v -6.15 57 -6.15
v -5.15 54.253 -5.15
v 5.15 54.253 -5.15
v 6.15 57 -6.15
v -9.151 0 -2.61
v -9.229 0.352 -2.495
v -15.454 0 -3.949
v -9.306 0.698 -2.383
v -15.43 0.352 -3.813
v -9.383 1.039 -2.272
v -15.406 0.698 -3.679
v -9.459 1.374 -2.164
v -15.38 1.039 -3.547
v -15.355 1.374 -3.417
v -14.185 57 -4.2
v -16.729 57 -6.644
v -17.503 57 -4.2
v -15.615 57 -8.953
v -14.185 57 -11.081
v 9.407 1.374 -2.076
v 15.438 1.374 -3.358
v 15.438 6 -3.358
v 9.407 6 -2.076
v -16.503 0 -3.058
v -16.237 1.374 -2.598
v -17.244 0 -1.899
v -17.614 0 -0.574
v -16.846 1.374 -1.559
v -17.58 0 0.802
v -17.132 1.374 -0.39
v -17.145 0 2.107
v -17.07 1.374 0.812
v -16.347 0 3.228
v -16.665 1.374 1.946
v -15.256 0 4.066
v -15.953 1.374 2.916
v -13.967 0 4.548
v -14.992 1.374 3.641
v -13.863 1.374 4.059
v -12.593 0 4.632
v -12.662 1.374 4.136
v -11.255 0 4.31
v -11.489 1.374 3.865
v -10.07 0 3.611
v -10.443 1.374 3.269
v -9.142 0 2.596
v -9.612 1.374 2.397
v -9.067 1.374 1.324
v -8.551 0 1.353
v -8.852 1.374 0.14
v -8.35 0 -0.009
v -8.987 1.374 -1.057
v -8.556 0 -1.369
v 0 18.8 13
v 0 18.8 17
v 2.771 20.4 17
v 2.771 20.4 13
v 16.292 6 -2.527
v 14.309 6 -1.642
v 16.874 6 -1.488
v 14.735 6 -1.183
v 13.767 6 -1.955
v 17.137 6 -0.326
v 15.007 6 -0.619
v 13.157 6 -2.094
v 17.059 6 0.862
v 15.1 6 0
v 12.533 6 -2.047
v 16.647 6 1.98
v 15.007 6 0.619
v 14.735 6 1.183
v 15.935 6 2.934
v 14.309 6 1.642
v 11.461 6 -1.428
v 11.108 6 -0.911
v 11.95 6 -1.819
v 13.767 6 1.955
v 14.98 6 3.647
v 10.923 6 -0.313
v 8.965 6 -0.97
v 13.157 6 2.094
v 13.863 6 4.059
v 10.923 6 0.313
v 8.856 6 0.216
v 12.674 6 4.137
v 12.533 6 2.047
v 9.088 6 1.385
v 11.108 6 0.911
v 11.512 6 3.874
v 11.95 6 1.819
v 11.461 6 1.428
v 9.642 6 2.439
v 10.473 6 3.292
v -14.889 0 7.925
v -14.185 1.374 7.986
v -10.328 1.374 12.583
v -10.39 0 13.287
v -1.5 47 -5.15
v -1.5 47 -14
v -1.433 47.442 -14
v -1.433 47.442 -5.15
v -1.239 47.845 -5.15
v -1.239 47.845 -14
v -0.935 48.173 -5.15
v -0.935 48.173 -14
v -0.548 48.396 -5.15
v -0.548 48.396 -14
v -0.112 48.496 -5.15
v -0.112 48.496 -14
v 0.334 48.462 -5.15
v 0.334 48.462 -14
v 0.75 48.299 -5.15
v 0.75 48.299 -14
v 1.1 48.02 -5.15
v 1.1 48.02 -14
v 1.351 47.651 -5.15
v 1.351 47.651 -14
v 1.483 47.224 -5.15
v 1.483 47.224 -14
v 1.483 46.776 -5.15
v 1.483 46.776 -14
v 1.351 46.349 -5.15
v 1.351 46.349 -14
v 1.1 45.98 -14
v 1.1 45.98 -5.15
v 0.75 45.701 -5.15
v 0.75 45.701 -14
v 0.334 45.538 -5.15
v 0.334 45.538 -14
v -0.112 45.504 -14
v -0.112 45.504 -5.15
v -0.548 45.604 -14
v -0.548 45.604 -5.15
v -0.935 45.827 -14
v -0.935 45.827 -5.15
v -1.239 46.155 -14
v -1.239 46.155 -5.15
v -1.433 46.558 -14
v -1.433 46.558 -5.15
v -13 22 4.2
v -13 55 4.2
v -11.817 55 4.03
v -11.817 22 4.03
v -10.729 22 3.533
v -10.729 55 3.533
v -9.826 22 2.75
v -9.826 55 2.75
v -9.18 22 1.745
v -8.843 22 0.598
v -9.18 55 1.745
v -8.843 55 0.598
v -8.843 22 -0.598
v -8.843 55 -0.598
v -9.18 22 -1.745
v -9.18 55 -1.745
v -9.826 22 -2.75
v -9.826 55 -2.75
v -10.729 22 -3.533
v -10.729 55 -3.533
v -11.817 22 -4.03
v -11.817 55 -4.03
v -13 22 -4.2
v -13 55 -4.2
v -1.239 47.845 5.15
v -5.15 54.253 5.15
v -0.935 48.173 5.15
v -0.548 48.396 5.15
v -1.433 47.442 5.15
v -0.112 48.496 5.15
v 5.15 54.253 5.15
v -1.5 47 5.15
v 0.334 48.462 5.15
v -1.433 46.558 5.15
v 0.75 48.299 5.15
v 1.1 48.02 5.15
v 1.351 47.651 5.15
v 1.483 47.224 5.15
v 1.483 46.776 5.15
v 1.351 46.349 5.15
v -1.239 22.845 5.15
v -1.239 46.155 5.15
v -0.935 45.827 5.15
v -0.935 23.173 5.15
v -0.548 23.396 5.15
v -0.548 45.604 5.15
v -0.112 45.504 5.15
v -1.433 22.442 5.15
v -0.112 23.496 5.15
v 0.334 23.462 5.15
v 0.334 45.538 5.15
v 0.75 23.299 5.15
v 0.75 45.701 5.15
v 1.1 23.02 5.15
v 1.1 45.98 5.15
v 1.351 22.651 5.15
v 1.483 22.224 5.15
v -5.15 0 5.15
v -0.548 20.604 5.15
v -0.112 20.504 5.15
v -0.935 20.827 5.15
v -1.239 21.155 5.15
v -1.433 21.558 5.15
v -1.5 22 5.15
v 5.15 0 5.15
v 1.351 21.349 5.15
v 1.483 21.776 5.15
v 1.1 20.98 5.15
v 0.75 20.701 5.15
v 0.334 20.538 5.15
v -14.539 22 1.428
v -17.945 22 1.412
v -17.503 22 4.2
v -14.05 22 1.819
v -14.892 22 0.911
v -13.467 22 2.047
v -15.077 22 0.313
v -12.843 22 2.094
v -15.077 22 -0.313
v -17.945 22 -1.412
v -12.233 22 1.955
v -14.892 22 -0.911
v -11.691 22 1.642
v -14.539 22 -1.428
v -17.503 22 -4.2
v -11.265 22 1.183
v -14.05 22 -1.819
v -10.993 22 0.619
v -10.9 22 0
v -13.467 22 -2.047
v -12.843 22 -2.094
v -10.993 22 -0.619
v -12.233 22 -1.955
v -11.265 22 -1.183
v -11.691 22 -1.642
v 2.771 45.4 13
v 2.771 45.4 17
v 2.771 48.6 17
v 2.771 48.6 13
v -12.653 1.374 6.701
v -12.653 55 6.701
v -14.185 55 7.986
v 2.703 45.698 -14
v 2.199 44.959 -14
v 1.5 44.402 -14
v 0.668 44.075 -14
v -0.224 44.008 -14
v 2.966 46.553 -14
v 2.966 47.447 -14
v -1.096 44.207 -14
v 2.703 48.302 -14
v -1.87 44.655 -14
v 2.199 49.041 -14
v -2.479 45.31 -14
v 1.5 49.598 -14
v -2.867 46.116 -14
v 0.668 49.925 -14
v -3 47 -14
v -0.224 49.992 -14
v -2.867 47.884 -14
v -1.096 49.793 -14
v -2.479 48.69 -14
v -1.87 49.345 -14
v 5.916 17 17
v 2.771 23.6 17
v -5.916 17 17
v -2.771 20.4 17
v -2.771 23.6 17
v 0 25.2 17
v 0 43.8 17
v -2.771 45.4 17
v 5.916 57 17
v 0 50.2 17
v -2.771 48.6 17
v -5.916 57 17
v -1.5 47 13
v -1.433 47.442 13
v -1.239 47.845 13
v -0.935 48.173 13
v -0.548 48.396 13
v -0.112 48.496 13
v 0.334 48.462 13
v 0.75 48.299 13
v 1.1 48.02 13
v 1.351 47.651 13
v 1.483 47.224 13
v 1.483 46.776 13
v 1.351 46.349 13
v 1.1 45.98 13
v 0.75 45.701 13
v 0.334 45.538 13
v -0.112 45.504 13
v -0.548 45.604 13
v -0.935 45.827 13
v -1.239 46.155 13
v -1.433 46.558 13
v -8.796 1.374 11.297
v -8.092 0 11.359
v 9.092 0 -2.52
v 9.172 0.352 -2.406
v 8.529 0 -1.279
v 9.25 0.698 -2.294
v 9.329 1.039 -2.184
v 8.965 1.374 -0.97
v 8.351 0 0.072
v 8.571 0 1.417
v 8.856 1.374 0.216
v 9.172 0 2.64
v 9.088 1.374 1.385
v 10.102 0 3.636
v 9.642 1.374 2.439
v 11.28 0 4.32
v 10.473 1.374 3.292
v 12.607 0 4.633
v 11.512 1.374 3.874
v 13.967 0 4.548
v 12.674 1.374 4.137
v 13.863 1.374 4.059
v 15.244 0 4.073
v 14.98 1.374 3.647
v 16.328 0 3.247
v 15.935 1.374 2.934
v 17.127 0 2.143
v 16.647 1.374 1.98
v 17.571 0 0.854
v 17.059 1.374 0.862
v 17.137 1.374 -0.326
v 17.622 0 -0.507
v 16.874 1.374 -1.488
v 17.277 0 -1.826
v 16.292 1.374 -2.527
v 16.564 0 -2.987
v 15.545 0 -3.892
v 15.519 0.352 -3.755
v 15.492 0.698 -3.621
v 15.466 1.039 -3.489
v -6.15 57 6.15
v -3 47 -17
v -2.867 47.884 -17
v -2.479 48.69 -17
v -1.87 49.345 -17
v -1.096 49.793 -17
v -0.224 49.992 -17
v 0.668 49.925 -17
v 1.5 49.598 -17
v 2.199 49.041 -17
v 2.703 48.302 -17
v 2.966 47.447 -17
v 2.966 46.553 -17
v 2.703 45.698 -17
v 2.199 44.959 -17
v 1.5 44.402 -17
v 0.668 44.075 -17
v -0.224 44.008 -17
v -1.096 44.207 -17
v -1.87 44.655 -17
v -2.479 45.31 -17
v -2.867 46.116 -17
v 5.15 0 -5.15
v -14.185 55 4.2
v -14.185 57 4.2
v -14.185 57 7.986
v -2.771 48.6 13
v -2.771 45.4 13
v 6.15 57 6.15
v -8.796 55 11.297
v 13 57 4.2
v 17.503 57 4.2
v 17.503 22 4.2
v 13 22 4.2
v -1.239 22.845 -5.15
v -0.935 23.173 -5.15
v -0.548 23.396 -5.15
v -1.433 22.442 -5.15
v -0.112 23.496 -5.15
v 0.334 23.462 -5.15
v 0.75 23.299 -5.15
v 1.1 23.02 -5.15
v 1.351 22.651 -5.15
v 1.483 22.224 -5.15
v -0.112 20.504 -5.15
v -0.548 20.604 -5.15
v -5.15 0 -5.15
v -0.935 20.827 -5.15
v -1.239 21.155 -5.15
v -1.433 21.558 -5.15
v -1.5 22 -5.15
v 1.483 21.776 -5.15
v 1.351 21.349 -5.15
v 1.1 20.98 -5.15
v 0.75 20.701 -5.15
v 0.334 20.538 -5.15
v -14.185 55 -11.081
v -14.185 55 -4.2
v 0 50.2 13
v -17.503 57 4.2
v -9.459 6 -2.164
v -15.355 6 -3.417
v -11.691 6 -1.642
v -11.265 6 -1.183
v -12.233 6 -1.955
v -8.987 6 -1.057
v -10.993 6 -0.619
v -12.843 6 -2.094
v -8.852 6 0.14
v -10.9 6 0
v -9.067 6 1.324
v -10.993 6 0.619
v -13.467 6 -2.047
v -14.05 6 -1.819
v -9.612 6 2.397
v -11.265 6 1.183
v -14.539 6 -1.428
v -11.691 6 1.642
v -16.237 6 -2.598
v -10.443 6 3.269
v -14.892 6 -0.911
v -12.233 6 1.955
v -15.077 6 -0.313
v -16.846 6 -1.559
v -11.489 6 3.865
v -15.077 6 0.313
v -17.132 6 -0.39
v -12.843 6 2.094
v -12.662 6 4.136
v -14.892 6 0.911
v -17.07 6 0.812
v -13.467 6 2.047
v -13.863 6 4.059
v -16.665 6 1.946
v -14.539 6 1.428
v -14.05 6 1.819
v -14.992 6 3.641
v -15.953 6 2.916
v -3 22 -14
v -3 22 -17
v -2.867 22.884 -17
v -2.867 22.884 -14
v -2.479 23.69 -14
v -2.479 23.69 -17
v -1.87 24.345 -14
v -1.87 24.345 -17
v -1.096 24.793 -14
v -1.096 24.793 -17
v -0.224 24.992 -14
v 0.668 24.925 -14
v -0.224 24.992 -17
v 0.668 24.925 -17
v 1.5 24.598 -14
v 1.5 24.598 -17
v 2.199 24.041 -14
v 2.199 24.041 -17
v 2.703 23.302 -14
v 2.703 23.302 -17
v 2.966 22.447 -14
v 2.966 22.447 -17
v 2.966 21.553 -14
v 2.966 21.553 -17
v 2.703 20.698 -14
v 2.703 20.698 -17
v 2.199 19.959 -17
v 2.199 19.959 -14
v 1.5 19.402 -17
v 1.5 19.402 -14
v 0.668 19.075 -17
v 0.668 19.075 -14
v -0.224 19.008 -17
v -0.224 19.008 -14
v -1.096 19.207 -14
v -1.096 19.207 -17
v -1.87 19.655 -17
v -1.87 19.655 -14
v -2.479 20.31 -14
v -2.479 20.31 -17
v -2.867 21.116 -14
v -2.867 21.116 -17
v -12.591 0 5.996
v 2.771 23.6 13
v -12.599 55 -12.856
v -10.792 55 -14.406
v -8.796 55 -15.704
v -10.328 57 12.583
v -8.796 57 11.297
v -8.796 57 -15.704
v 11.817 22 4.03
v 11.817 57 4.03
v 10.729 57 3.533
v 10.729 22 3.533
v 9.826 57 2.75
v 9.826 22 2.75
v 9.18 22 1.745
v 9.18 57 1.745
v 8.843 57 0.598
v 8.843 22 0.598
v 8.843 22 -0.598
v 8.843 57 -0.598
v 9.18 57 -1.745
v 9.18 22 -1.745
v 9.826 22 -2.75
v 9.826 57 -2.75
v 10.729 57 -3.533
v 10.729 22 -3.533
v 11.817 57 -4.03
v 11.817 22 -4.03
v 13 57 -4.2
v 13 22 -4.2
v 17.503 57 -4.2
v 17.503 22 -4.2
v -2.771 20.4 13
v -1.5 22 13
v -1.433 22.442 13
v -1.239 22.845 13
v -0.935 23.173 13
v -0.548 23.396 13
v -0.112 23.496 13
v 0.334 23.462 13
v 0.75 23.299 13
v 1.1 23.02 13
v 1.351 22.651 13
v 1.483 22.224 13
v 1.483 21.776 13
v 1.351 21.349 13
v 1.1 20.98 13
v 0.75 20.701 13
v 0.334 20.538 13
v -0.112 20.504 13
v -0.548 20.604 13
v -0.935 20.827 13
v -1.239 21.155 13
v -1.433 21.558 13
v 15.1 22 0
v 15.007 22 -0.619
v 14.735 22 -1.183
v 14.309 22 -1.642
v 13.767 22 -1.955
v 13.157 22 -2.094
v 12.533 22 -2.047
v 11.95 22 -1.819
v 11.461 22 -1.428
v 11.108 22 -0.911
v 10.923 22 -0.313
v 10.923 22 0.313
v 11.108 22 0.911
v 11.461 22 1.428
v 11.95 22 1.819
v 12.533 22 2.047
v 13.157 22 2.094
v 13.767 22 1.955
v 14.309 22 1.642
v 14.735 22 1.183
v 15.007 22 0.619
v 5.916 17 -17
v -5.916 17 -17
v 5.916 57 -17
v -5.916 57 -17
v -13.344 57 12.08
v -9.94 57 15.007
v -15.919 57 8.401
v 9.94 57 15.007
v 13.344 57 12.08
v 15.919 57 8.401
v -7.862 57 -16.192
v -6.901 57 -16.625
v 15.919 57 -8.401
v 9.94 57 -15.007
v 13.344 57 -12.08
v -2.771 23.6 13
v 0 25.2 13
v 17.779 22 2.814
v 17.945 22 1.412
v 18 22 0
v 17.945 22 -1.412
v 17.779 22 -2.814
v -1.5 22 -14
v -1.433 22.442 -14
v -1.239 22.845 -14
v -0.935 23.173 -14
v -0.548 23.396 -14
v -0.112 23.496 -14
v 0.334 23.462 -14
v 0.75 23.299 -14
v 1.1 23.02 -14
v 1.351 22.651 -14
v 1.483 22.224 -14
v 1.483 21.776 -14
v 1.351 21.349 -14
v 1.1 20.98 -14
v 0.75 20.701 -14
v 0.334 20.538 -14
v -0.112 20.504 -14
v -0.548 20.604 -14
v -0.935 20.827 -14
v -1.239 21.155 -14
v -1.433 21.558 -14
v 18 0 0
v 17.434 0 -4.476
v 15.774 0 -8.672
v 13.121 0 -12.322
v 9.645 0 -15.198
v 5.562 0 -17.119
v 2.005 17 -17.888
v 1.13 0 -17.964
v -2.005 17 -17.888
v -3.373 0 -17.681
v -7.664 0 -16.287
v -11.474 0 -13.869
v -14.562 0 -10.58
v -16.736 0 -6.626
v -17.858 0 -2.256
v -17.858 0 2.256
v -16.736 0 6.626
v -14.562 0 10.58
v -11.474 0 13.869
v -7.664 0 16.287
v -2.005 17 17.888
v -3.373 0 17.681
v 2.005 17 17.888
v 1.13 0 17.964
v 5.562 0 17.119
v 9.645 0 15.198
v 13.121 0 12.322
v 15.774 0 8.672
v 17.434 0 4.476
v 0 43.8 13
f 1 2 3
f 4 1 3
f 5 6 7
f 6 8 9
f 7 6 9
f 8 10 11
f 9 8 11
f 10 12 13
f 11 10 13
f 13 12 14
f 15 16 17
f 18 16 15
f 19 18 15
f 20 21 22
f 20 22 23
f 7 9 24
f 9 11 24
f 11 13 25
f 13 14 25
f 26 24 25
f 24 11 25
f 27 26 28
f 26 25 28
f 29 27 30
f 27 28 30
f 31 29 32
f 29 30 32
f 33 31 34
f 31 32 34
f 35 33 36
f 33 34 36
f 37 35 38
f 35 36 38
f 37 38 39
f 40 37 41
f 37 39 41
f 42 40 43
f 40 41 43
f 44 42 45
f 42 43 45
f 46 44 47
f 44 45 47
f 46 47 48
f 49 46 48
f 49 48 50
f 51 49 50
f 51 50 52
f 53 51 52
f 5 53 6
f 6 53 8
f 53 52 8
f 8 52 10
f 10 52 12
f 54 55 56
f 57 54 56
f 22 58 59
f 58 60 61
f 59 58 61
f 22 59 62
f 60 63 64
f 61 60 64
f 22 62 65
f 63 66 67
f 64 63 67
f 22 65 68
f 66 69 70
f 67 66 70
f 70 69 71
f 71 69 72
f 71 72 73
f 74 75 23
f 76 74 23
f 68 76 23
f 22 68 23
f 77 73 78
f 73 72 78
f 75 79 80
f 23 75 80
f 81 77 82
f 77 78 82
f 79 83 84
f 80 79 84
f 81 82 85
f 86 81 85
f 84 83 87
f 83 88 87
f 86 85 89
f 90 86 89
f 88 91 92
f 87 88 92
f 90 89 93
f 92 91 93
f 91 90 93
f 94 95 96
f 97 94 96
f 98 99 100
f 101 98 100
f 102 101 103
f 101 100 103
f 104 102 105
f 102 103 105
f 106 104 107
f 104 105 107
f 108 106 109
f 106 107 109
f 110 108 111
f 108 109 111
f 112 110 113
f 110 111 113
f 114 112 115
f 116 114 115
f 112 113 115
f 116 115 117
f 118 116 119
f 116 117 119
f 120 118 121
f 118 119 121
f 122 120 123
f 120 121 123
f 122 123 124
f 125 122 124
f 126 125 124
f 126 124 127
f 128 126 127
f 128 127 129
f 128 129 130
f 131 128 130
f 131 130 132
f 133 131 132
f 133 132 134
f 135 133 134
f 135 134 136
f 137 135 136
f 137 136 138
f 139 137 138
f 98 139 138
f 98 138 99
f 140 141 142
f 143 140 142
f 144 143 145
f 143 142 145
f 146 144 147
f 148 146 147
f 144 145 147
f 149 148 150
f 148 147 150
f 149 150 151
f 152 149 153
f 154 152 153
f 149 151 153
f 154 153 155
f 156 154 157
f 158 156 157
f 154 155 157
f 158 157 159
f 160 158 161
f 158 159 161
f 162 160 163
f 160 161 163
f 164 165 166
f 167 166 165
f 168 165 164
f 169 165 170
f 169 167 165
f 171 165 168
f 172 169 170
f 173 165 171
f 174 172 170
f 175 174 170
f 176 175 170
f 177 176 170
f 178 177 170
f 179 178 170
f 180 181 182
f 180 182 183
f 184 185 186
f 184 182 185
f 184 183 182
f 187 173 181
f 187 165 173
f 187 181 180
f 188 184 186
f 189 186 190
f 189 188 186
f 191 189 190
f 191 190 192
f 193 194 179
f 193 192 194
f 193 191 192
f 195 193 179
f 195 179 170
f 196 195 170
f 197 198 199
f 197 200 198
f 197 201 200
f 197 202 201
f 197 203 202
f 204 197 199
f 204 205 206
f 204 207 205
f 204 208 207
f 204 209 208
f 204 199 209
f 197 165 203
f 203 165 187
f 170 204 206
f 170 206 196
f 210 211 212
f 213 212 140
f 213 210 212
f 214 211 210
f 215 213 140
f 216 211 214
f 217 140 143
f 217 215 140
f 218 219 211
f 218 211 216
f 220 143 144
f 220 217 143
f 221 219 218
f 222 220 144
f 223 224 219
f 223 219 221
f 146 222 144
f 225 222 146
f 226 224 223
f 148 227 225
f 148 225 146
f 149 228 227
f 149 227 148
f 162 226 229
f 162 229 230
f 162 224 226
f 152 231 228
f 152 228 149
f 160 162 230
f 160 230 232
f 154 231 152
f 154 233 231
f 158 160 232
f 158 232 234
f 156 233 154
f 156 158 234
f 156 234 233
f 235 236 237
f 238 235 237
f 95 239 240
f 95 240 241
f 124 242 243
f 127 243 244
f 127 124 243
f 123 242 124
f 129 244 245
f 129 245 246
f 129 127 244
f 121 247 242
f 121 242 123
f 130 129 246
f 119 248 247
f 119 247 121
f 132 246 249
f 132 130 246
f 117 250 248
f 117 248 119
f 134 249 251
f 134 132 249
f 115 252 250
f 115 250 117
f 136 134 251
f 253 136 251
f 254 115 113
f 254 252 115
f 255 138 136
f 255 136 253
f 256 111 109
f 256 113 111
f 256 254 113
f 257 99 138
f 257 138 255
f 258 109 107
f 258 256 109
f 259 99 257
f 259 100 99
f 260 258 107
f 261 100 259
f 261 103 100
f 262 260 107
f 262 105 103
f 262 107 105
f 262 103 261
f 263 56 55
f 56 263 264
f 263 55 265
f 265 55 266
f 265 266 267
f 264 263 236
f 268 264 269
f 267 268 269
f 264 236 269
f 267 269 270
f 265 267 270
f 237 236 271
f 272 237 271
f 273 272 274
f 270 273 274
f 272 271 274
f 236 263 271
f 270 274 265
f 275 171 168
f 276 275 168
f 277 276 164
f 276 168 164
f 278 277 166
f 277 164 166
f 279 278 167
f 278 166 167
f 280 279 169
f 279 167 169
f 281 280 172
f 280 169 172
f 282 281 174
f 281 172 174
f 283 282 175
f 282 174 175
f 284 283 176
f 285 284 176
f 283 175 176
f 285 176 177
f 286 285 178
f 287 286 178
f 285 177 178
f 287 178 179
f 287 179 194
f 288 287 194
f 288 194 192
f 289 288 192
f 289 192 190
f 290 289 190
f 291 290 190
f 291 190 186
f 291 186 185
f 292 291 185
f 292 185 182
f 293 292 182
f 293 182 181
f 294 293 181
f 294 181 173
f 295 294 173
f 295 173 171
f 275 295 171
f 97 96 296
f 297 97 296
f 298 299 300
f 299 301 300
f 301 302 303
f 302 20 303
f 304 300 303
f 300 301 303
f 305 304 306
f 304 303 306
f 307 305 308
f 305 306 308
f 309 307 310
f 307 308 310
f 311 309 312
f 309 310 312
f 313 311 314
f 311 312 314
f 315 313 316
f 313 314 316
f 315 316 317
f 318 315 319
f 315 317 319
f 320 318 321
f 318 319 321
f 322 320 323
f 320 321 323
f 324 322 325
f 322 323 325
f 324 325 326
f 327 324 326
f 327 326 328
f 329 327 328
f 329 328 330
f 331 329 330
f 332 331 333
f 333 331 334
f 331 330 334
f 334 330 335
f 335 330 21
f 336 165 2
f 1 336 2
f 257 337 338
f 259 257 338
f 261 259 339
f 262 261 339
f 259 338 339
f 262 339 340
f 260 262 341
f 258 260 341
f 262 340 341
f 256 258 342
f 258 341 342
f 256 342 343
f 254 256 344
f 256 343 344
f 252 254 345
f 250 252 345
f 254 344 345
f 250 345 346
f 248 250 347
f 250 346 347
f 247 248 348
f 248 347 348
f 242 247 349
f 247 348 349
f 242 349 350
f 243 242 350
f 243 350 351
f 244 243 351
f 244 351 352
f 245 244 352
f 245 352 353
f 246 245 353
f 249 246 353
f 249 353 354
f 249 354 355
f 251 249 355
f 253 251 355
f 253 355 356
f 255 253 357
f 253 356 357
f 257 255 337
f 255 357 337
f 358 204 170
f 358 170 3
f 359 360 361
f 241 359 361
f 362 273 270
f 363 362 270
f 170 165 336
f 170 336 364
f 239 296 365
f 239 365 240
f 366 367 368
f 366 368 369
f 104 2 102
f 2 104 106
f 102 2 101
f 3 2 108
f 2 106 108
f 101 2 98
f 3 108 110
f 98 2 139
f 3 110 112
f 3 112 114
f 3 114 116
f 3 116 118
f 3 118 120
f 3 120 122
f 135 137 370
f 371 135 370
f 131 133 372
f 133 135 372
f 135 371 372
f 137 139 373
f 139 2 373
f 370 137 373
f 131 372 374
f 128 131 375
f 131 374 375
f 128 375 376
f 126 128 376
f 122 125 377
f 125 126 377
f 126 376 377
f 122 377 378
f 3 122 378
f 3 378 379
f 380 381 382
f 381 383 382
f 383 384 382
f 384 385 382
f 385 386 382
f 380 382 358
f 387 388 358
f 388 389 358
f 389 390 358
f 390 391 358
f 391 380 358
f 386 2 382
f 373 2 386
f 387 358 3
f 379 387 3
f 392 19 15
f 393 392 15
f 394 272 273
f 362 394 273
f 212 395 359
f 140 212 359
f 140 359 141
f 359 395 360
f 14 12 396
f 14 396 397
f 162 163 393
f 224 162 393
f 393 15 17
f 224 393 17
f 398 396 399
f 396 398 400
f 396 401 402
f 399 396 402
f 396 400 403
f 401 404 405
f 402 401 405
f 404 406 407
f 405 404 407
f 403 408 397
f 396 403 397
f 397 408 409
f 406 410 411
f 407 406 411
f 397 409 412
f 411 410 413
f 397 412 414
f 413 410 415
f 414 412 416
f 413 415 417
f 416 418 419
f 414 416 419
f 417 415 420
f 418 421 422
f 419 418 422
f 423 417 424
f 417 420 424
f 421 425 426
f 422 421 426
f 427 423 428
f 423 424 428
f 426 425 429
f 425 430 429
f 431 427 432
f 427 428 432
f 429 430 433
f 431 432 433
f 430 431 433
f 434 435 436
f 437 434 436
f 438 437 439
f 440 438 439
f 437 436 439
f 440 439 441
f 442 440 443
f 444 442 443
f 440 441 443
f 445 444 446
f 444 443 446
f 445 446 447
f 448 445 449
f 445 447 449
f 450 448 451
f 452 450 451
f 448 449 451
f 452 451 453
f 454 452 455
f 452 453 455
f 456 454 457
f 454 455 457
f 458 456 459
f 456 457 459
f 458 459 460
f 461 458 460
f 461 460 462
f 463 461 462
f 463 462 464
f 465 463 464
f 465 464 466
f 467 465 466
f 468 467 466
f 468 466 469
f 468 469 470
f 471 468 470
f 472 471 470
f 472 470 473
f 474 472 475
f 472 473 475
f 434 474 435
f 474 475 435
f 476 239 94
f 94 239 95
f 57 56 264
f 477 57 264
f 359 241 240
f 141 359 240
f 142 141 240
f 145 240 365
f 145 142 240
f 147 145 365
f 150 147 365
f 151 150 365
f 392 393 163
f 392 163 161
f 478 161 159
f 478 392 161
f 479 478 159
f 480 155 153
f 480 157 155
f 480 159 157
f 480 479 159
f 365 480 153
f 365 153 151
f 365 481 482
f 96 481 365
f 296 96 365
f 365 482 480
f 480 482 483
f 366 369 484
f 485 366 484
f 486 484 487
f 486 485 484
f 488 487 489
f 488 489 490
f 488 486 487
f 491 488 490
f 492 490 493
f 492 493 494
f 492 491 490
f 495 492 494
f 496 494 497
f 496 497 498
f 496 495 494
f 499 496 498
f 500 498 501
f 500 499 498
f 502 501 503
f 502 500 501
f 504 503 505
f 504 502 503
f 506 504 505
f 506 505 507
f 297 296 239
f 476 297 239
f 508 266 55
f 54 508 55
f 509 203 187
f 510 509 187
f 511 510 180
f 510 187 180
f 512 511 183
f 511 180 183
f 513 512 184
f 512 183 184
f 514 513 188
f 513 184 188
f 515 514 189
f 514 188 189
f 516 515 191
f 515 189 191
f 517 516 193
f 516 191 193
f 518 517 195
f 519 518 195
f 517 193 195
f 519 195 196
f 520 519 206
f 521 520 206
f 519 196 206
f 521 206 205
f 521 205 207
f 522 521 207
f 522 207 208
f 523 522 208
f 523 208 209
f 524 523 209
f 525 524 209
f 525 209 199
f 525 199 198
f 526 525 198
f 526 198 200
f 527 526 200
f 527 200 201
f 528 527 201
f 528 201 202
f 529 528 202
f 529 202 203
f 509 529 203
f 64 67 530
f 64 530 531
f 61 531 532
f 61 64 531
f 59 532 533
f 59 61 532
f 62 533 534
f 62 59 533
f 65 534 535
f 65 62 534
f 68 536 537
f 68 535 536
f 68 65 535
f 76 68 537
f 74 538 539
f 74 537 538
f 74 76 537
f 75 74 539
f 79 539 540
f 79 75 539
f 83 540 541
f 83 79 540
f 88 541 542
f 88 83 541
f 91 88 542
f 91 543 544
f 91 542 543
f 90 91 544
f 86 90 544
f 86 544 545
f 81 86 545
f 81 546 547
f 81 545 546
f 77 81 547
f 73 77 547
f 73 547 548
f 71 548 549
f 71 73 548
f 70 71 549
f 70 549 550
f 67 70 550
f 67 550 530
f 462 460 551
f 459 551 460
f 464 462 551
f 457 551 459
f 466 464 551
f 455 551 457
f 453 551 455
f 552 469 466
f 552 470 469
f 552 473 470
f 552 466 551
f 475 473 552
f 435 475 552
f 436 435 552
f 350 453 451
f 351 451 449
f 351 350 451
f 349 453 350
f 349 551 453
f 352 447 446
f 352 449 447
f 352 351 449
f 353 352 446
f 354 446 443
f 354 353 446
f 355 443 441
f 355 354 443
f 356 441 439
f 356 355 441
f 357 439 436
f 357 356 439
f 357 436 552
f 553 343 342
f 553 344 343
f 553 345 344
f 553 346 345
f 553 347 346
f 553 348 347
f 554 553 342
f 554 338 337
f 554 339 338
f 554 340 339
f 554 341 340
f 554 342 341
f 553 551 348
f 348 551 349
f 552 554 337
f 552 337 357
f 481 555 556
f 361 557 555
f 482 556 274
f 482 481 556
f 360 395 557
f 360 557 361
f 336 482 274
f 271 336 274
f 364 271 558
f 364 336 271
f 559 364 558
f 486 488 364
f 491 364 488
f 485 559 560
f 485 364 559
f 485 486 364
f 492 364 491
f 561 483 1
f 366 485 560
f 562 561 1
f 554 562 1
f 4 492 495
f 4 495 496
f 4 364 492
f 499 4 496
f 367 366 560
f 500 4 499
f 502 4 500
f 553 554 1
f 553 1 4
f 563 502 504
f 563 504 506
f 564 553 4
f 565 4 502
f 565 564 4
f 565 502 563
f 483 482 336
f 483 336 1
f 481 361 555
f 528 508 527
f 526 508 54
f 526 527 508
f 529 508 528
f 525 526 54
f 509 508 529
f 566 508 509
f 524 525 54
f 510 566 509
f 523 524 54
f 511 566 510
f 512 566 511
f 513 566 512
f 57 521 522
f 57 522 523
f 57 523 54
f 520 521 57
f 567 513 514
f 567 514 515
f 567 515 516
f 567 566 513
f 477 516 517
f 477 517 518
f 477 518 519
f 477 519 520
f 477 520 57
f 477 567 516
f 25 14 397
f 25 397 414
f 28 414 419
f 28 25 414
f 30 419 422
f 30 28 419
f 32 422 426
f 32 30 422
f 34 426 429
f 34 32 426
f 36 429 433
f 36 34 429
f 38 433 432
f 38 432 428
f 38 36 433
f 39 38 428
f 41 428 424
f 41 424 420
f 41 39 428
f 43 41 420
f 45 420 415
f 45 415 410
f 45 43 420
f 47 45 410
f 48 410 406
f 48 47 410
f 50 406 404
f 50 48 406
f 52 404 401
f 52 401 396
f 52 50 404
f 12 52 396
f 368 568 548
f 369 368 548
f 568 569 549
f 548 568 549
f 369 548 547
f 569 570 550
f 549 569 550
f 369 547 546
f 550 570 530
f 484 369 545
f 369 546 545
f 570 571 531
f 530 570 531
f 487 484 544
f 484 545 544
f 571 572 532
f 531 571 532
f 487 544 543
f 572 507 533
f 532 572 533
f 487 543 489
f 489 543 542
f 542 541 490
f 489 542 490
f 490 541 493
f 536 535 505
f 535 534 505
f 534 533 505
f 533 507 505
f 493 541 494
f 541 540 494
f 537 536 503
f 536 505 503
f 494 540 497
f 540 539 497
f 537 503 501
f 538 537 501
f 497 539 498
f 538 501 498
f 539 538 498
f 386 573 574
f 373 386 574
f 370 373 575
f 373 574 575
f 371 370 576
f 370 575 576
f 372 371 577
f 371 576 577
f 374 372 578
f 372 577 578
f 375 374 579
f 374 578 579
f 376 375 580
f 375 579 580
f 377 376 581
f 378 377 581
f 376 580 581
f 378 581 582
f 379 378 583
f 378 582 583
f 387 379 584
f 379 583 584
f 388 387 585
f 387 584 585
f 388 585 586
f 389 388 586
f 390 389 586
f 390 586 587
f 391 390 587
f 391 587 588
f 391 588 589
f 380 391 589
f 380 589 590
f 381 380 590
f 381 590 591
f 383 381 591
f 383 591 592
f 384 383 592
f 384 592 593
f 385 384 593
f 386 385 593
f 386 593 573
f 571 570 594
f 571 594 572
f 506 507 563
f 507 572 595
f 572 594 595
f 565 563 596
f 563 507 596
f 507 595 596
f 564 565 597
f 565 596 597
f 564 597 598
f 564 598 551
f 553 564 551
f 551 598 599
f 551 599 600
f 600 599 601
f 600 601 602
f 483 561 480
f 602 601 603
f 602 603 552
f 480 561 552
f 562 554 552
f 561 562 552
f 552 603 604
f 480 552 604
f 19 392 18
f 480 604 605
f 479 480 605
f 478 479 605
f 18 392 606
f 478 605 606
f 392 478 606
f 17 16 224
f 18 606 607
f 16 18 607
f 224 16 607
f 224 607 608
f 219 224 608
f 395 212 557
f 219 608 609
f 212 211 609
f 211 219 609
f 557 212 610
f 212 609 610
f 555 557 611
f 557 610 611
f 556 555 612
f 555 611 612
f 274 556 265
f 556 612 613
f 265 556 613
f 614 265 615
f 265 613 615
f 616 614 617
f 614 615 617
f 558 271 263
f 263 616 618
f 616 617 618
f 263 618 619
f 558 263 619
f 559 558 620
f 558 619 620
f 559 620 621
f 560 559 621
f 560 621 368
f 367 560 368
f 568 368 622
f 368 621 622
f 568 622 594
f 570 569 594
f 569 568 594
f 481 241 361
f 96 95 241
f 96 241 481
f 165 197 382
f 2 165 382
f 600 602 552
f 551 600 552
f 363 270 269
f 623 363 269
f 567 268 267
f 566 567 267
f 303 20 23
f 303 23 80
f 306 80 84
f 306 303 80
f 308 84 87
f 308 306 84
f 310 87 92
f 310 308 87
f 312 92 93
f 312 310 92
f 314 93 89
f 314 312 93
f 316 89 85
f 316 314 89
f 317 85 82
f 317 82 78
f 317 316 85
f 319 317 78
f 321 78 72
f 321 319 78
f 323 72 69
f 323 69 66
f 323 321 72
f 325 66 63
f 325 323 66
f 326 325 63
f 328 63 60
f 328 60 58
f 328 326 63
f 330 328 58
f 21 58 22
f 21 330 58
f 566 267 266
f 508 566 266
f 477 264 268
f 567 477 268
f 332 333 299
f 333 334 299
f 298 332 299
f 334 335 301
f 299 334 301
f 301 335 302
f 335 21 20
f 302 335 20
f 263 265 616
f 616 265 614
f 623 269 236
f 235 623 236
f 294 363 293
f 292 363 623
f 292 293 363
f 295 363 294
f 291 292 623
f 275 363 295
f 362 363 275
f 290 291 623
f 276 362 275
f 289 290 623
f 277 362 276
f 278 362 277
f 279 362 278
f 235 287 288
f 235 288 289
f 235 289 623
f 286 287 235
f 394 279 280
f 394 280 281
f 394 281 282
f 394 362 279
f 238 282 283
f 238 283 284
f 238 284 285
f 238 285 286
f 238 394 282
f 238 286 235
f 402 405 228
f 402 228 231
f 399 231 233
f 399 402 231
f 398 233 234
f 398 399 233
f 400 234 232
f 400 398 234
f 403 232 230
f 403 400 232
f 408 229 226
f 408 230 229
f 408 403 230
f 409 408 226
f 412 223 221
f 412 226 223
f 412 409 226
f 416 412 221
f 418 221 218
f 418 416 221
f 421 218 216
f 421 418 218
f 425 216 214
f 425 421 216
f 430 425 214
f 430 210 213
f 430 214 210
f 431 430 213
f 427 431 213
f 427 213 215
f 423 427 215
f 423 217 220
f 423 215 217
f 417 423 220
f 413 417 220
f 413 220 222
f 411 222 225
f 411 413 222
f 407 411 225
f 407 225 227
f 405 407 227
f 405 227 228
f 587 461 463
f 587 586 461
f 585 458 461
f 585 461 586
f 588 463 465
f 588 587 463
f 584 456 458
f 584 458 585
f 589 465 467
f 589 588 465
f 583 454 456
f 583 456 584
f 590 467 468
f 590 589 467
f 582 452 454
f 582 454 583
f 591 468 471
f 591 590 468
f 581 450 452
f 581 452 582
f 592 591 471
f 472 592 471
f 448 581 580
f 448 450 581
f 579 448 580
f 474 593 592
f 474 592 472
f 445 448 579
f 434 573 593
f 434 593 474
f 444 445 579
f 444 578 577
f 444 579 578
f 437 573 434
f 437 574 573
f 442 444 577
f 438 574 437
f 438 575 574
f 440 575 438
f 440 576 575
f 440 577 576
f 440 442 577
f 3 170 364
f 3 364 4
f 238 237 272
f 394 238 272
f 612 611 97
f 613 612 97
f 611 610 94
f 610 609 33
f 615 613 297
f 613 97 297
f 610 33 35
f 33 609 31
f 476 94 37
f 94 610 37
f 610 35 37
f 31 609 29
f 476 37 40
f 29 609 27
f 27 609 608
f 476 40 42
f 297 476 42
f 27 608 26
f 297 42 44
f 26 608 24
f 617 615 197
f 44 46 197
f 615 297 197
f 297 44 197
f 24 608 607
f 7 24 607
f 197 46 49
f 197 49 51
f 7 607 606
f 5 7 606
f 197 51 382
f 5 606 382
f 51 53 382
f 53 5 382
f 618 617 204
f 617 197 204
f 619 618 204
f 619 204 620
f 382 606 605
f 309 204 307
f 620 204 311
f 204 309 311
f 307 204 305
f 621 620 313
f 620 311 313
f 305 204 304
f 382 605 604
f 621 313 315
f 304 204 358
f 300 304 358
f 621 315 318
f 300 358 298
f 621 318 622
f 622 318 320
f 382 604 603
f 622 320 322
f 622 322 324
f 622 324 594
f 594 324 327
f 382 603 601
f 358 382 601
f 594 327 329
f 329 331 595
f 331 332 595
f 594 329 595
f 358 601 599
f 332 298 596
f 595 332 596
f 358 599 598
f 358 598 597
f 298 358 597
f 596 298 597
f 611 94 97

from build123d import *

# Parameters (mm, degrees)
SKETCH1_R           = 18
SKETCH1_R_2         = 2.1
SKETCH1_W           = 10.3
SKETCH1_H           = 10.3
BOSS_EXTRUDE1_DEPTH = 57
CUT_EXTRUDE4_DEPTH  = 40
SKETCH6_R           = 1.5
CUT_EXTRUDE5_DEPTH  = 36
SKETCH7_R           = 3
CUT_EXTRUDE6_DEPTH  = 3
CUT_EXTRUDE7_DEPTH  = 4
CHAMFER1_SIZE       = 1
CHAMFER1_SIZE2      = 2.747477419
CUT_EXTRUDE9_DEPTH  = 6
CHAMFER2_SIZE       = 0.5
CHAMFER2_SIZE2      = 1.37373871
CUT_EXTRUDE10_DEPTH = 35
CUT_EXTRUDE11_DEPTH = 58
CHAMFER3_SIZE       = 0.5
CHAMFER3_SIZE2      = 1.37373871
CUT_EXTRUDE13_DEPTH = 2


with BuildPart() as part:
    # Sketch1 → Boss-Extrude1 (new body)
    with BuildSketch(Plane(origin=(0, 0, 0), x_dir=(1, 0, 0), z_dir=(0, 1, 0))):
        Circle(SKETCH1_R)
        with Locations((13, 0)):
            Circle(SKETCH1_R_2, mode=Mode.SUBTRACT)
        with Locations((-13, 0)):
            Circle(SKETCH1_R_2, mode=Mode.SUBTRACT)
        Rectangle(SKETCH1_W, SKETCH1_H, mode=Mode.SUBTRACT)
    extrude(amount=BOSS_EXTRUDE1_DEPTH)

    # Sketch5 → Cut-Extrude4 (cut)
    with BuildSketch(Plane(origin=(0, 57, 0), x_dir=(1, 0, 0), z_dir=(0, 1, 0))):
        with BuildLine():
            Line((5.916079783, 17), (-5.916079783, 17))
            ThreePointArc((-5.916079783, 17), (0, 18), (5.916079783, 17))
        make_face()
        with BuildLine():
            Line((5.916079783, -17), (-5.916079783, -17))
            ThreePointArc((-5.916079783, -17), (0, -18), (5.916079783, -17))
        make_face()
    extrude(amount=-CUT_EXTRUDE4_DEPTH, mode=Mode.SUBTRACT)

    # Sketch6 → Cut-Extrude5 (cut, through all)
    with BuildSketch(Plane(origin=(0, 0, -17), x_dir=(-1, 0, 0), z_dir=(0, 0, -1))):
        with Locations((0, 47)):
            Circle(SKETCH6_R)
        with Locations((0, 22)):
            Circle(SKETCH6_R)
    extrude(amount=-CUT_EXTRUDE5_DEPTH, mode=Mode.SUBTRACT)

    # Sketch7 → Cut-Extrude6 (cut)
    with BuildSketch(Plane(origin=(0, 0, -17), x_dir=(-1, 0, 0), z_dir=(0, 0, -1))):
        with Locations((0, 47)):
            Circle(SKETCH7_R)
        with Locations((0, 22)):
            Circle(SKETCH7_R)
    extrude(amount=-CUT_EXTRUDE6_DEPTH, mode=Mode.SUBTRACT)

    # Sketch8 → Cut-Extrude7 (cut)
    with BuildSketch(Plane.XY.offset(17)):
        Polygon((0, 43.8), (2.771281292, 45.4), (2.771281292, 48.6), (0, 50.2), (-2.771281292, 48.6), (-2.771281292, 45.4), align=None)
        Polygon((0, 18.8), (2.771281292, 20.4), (2.771281292, 23.6), (0, 25.2), (-2.771281292, 23.6), (-2.771281292, 20.4), align=None)
    extrude(amount=-CUT_EXTRUDE7_DEPTH, mode=Mode.SUBTRACT)

    # Chamfer1
    chamfer1_edges = [part.edges().sort_by_distance(p)[0] for p in [
        (0, 57, -5.15),
        (-5.15, 57, 0),
        (0, 57, 5.15),
        (5.15, 57, 0),
    ]]
    chamfer1_side = [part.faces().sort_by_distance(p)[0] for p in [
        (14.267618119, 57, 10.141691708),
    ]]
    chamfer(chamfer1_edges, length=CHAMFER1_SIZE, length2=CHAMFER1_SIZE2, reference=chamfer1_side[0])

    # Sketch9 → Cut-Extrude9 (cut)
    with BuildSketch(Plane.XZ):
        with BuildLine():
            Line((15.438263477, -3.358179747), (9.406640719, -2.076118753))
            ThreePointArc((9.406640719, -2.076118753), (13.862833517, 4.059312543), (15.438263477, -3.358179747))
        make_face()
        with BuildLine():
            Line((-9.458796565, -2.163880365), (-15.354920877, -3.417140276))
            ThreePointArc((-15.354920877, -3.417140276), (-13.862833517, 4.059312543), (-9.458796565, -2.163880365))
        make_face()
    extrude(amount=-CUT_EXTRUDE9_DEPTH, mode=Mode.SUBTRACT)

    # Chamfer2
    chamfer2_edges = [part.edges().sort_by_distance(p)[0] for p in [
        (13.862833517, 0, 4.059312543),
        (12.422452098, 0, -2.71714925),
        (-13.862833517, 0, 4.059312543),
        (-12.406858721, 0, -2.79051032),
    ]]
    chamfer2_side = [part.faces().sort_by_distance(p)[0] for p in [
        (-17.490883118, 0, 0),
    ]]
    chamfer(chamfer2_edges, length=CHAMFER2_SIZE, length2=CHAMFER2_SIZE2, reference=chamfer2_side[0])

    # Sketch10 → Cut-Extrude10 (cut)
    with BuildSketch(Plane(origin=(0, 57, 0), x_dir=(1, 0, 0), z_dir=(0, 1, 0))):
        with BuildLine():
            Line((13, 4.2), (21, 4.2))
            Line((21, 4.2), (21, -4.2))
            Line((21, -4.2), (13, -4.2))
            ThreePointArc((13, -4.2), (8.8, 0), (13, 4.2))
        make_face()
        with BuildLine():
            Line((-13, 4.2), (-21, 4.2))
            Line((-21, 4.2), (-21, -4.2))
            Line((-21, -4.2), (-13, -4.2))
            ThreePointArc((-13, -4.2), (-8.8, 0), (-13, 4.2))
        make_face()
    extrude(amount=-CUT_EXTRUDE10_DEPTH, mode=Mode.SUBTRACT)

    # Sketch11 → Cut-Extrude11 (cut, through all)
    with BuildSketch(Plane.XZ):
        Polygon((-14.185073919, 7.986468426), (-10.328348261, 12.582735084), (-8.796259375, 11.297159865), (-12.652985033, 6.700893206), align=None)
    extrude(amount=-CUT_EXTRUDE11_DEPTH, mode=Mode.SUBTRACT)

    # Chamfer3
    chamfer3_edges = [part.edges().sort_by_distance(p)[0] for p in [
        (-13.419029476, 0, 7.343680816),
        (-10.724622204, 0, 8.999026536),
        (-9.562303818, 0, 11.939947475),
        (-12.25671109, 0, 10.284601755),
    ]]
    chamfer3_side = [part.faces().sort_by_distance(p)[0] for p in [
        (-17.949088312, 0, 0),
    ]]
    chamfer(chamfer3_edges, length=CHAMFER3_SIZE, length2=CHAMFER3_SIZE2, reference=chamfer3_side[0])

    # Sketch13 → Cut-Extrude13 (cut)
    with BuildSketch(Plane(origin=(0, 57, 0), x_dir=(1, 0, 0), z_dir=(0, 1, 0))):
        with BuildLine():
            Line((-8.796259375, -11.297159865), (-8.796259375, 15.704324914))
            ThreePointArc((-8.796259375, 15.704324914), (-11.720909208, 13.660903606), (-14.185073919, 11.080779662))
            Line((-14.185073919, 11.080779662), (-14.185073919, -7.986468426))
            Line((-14.185073919, -7.986468426), (-8.796259375, -11.297159865))
        make_face()
    extrude(amount=-CUT_EXTRUDE13_DEPTH, mode=Mode.SUBTRACT)


solid = part.part
